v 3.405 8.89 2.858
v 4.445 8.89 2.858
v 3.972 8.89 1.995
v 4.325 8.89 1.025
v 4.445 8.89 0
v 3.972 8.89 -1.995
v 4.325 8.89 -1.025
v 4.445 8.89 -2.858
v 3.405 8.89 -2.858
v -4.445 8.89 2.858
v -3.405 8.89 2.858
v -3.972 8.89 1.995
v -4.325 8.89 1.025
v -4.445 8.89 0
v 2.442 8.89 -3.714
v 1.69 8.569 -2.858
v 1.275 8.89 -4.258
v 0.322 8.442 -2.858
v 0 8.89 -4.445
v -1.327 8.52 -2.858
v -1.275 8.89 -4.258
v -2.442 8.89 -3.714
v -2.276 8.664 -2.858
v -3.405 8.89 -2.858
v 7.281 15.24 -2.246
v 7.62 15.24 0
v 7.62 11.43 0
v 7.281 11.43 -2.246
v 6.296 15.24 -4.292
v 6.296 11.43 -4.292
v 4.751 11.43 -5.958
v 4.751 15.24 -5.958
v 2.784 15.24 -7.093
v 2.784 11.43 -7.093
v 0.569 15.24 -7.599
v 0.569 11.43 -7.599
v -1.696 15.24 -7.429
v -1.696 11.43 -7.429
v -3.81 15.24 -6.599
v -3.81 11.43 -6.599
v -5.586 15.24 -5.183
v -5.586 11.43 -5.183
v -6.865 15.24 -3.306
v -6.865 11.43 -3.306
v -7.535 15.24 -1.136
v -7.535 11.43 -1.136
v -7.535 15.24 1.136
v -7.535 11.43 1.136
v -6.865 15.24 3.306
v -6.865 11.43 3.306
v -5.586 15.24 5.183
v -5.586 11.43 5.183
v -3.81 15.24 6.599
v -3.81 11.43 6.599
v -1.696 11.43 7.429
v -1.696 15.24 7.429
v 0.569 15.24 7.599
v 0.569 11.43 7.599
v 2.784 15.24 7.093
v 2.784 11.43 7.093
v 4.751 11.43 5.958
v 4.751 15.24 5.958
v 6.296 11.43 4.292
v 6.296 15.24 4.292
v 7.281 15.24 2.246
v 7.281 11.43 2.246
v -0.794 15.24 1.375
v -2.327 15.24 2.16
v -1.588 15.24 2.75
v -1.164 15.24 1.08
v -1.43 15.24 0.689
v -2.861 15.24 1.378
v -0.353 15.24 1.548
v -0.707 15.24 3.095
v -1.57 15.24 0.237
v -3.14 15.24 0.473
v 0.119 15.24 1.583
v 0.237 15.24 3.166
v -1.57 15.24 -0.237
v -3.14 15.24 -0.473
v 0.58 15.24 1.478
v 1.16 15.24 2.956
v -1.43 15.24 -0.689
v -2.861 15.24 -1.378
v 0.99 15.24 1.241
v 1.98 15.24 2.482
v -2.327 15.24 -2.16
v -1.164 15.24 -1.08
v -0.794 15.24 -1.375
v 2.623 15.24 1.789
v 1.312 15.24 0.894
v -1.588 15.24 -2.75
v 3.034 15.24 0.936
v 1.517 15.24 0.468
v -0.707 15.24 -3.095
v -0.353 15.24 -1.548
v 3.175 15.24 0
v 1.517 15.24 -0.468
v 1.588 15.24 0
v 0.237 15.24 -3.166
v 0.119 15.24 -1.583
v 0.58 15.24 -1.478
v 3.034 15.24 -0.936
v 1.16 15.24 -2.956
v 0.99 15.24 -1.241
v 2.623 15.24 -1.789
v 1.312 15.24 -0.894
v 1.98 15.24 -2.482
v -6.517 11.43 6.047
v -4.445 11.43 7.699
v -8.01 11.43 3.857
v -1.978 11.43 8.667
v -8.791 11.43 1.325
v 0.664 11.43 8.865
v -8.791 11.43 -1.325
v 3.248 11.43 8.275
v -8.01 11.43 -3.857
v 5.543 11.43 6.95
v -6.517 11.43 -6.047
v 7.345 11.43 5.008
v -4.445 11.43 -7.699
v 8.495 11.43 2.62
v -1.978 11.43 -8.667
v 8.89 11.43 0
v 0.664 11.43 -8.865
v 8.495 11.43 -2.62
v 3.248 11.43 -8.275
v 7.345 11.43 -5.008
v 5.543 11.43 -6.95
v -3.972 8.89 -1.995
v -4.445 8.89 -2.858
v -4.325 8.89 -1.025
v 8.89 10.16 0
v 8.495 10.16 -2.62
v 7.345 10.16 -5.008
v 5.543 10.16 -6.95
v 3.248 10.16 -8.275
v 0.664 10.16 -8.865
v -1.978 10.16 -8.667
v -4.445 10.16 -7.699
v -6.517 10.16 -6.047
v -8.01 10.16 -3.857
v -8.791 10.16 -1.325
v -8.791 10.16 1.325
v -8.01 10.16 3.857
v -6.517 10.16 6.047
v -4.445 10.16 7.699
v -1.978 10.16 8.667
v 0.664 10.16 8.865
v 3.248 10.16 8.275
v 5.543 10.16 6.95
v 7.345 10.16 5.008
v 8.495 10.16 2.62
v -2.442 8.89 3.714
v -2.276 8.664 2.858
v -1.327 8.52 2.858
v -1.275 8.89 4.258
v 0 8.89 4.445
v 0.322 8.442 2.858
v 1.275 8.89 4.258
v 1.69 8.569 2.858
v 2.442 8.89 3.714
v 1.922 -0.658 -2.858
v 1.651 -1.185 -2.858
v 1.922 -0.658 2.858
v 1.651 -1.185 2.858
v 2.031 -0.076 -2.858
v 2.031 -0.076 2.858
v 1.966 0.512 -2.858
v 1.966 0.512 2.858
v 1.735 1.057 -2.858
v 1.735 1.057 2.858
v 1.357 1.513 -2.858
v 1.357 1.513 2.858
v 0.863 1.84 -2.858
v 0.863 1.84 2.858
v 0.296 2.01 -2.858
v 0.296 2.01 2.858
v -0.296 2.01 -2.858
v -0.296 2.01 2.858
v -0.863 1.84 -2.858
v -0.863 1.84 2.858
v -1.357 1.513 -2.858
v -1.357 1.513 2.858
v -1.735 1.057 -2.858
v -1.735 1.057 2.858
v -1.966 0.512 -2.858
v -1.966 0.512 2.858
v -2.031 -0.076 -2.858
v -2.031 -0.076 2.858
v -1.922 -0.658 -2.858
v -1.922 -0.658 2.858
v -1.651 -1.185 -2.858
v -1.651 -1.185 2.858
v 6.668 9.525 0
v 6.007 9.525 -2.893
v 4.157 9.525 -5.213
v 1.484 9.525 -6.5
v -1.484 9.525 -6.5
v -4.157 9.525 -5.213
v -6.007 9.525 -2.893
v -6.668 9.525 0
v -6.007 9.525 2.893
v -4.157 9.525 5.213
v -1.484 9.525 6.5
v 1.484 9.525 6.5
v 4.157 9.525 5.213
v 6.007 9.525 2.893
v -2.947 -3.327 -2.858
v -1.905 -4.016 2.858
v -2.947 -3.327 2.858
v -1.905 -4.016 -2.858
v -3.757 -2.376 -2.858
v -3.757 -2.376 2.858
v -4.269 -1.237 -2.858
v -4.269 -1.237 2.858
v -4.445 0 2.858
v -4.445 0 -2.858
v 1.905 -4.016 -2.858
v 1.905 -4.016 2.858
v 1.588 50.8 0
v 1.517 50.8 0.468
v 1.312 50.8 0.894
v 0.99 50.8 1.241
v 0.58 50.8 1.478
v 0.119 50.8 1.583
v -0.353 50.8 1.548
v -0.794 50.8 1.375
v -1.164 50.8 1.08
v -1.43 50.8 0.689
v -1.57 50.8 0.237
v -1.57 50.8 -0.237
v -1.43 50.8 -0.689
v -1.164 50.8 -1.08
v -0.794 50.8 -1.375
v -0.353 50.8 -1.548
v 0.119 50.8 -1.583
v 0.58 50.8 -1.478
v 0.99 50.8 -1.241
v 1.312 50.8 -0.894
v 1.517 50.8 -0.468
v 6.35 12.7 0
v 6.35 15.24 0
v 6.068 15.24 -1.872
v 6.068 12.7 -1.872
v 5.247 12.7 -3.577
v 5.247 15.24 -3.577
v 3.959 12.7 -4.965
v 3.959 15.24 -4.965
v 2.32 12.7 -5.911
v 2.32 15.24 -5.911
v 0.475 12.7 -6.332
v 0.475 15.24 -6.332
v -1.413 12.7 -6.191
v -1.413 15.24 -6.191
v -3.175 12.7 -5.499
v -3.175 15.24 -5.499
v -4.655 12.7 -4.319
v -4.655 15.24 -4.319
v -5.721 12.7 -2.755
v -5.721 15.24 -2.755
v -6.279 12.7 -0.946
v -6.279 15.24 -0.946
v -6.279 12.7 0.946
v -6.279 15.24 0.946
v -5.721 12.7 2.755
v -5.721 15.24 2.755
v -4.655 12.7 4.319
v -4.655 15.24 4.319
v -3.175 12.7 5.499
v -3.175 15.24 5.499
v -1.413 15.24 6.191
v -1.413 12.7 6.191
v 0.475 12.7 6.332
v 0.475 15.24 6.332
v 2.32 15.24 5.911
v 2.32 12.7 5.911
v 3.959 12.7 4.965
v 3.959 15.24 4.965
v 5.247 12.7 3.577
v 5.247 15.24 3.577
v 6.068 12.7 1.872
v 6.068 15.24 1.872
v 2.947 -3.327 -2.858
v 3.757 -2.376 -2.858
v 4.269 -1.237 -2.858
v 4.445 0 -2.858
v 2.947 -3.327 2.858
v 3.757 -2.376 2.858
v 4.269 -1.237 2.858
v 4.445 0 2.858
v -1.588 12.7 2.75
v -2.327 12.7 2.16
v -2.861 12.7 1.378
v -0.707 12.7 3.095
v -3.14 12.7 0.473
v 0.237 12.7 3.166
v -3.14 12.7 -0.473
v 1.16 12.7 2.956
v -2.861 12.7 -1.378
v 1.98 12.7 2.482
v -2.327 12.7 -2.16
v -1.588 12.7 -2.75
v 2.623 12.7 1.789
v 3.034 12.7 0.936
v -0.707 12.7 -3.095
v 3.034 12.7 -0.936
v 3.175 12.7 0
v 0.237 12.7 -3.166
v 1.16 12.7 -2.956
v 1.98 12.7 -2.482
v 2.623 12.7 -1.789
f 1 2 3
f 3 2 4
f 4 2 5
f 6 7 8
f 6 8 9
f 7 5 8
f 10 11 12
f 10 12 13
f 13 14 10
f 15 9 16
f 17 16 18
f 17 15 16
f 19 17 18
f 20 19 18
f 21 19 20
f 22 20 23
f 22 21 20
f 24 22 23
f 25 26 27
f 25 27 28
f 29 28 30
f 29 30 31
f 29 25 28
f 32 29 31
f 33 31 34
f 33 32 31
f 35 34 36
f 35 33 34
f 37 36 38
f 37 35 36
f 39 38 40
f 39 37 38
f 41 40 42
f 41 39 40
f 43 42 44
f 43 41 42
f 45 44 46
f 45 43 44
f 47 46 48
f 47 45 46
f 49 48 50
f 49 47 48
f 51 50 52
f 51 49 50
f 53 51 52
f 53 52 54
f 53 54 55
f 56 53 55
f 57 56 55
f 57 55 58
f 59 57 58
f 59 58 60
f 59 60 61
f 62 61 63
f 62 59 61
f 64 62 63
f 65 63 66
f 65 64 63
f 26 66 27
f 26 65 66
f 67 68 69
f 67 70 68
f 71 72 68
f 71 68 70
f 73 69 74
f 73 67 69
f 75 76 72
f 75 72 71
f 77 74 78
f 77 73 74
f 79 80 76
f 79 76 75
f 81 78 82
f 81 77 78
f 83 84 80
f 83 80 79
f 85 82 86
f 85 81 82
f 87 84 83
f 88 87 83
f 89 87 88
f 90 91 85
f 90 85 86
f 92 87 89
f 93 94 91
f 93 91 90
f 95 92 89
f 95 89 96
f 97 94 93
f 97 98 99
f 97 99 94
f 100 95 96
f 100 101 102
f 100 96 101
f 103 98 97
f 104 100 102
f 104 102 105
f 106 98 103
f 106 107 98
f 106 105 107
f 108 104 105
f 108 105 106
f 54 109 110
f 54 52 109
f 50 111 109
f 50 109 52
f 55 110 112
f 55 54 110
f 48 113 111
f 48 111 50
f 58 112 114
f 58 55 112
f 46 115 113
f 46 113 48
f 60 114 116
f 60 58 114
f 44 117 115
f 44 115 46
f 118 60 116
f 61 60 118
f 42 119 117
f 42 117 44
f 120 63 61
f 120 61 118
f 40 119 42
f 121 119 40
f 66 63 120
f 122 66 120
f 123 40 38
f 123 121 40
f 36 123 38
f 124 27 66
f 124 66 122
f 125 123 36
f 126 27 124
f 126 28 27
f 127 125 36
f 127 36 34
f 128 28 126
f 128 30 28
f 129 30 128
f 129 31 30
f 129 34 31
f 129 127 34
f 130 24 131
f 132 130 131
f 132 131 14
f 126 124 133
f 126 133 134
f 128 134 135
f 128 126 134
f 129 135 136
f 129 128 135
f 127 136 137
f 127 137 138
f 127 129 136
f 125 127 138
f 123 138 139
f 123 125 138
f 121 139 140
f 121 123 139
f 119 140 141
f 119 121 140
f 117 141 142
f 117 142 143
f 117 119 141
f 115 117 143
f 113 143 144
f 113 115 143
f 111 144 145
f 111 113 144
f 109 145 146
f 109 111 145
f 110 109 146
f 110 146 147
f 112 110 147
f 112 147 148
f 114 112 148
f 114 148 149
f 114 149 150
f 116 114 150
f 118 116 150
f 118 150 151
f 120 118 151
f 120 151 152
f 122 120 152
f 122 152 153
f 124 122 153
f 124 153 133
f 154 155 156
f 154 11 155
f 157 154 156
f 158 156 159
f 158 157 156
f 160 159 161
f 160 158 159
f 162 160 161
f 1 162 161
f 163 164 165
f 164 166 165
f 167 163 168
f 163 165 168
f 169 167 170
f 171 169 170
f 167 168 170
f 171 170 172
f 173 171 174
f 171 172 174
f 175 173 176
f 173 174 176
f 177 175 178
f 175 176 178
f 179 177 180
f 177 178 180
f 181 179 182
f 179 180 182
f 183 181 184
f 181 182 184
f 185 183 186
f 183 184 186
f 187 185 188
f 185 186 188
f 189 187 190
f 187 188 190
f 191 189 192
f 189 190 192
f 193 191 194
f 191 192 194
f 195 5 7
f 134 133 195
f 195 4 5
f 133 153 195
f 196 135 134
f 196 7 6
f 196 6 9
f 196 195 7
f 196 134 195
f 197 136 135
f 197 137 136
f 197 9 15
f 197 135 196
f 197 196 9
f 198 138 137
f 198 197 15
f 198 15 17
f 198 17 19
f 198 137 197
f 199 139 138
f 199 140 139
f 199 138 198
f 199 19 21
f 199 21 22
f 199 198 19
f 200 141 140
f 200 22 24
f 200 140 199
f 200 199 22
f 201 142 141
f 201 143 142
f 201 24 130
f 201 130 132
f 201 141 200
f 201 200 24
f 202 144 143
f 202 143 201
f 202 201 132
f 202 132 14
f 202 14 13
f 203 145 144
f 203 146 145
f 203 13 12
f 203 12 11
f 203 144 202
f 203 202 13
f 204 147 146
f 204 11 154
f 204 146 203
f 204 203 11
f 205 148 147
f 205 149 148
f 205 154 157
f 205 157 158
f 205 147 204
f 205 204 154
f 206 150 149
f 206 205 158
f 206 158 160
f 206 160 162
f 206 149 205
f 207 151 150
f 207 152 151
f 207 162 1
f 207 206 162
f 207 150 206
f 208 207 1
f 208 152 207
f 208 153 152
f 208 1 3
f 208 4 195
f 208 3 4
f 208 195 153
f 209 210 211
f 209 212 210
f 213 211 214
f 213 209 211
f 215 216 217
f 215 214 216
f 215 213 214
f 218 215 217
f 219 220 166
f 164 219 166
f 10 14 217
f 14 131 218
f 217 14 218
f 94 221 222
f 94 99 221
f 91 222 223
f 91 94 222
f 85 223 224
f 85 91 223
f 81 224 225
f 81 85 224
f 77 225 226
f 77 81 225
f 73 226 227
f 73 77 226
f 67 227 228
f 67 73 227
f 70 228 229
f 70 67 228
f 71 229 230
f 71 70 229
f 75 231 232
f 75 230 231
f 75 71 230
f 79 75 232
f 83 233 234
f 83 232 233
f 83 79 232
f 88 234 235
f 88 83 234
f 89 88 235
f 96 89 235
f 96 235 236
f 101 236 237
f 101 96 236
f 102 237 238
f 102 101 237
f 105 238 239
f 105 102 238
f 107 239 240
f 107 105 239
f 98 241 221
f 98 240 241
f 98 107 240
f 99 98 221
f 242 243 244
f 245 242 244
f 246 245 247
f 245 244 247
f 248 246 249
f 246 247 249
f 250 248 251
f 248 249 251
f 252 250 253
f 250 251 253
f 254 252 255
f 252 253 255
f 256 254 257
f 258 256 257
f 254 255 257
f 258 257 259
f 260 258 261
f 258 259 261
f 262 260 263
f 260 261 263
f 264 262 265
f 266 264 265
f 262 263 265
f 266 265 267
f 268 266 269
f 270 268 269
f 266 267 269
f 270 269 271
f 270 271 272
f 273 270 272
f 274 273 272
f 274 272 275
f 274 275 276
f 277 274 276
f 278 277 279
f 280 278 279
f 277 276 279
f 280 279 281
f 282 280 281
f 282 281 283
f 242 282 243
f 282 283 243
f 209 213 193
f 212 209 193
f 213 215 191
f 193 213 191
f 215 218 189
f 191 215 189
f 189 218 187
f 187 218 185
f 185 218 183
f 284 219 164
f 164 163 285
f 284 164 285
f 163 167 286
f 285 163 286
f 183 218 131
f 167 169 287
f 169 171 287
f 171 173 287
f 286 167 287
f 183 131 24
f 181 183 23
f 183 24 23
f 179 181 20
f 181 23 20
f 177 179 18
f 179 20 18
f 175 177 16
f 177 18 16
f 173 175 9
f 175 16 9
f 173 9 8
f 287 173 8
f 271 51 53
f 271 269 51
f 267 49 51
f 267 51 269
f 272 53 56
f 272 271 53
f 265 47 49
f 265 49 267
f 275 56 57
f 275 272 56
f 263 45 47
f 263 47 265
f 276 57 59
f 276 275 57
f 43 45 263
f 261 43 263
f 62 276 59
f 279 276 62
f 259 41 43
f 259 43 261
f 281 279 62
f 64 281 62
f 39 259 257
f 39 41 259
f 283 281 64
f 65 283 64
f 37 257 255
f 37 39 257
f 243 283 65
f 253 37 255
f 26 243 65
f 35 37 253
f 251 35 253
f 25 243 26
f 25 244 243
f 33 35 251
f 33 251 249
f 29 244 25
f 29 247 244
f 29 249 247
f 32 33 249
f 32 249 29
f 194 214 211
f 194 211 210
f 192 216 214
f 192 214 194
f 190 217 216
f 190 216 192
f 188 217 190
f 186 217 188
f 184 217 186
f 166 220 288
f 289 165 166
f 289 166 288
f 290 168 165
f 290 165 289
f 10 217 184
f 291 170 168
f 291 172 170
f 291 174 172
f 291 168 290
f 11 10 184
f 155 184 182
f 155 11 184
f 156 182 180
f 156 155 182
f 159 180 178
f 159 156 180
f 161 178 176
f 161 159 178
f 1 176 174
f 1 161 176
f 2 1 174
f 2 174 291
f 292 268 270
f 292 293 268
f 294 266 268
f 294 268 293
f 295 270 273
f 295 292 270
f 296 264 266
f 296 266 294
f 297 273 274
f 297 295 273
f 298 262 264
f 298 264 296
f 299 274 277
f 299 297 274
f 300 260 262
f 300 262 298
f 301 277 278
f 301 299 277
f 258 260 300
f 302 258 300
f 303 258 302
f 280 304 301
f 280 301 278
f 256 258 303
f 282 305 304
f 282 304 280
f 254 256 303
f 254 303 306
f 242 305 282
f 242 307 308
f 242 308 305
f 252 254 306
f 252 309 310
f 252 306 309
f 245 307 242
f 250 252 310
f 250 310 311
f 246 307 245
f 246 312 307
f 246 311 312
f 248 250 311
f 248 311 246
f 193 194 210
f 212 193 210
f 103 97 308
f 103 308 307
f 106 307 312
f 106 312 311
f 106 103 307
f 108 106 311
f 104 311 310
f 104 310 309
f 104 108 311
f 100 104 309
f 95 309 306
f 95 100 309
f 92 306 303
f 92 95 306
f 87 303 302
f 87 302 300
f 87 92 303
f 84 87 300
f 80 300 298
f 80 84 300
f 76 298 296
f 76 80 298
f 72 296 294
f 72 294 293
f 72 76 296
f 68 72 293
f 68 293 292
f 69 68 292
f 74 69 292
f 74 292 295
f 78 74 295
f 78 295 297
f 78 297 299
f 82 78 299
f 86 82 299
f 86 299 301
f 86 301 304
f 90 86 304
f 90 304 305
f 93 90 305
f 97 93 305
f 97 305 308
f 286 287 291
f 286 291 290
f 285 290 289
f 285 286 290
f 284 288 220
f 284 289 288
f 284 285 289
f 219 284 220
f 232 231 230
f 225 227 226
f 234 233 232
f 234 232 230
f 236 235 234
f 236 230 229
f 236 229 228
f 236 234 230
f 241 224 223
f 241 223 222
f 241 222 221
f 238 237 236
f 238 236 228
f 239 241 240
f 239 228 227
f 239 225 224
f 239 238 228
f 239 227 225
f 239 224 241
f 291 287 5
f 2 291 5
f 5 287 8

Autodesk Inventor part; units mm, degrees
ref_plane "YZ Plane" through (0, 0, 0) normal (1, 0, 0) x (0, 1, 0)
ref_plane "XZ Plane" through (0, 0, 0) normal (0, 1, 0) x (-1, 0, 0)
ref_plane "XY Plane" through (0, 0, 0) normal (0, 0, 1) x (1, 0, 0)
sketch "Sketch1" plane through (0, 0, 0) normal (0, 0, 1) x (1, 0, 0)
  arc A0 (-4.445, 0) -> (4.445, 0) centre (0, 0) ccw
  line L0 (-4.445, 0) -> (-4.445, 8.89)
  line L1 (-4.445, 8.89) -> (4.445, 8.89)
  line L2 (4.445, 8.89) -> (4.445, 0)
  arc A1 (4.445, 0) -> (-4.445, 0) centre (0, 0) ccw construction
  dimension "d0" = 8.89
  dimension "d1" = 8.89
sketch "Sketch1 outline for Extrusion1" plane through (0, 0, 0) normal (0, 0, 1) x (1, 0, 0)
  line L0 (-4.445, 8.89) -> (-4.445, 0)
  line L1 (4.445, 8.89) -> (-4.445, 8.89)
  line L2 (4.445, 0) -> (4.445, 8.89)
  arc A0 (-4.445, 0) -> (4.445, 0) centre (0, 0) ccw
extrude "Extrusion1" add sketch "Sketch1 outline for Extrusion1" along normal mid plane 5.715
sketch "Sketch2" plane through (0, 0, 2.8575) normal (0, 0, 1) x (1, 0, 0)
  arc A0 (1.651, -1.184577) -> (-1.651, -1.184577) centre (0, 0) ccw
  line L0 (1.651, -1.184577) -> (1.905, -4.016093)
  line L1 (0, 0) -> (0, -4.445) construction
  line L2 (-1.651, -1.184577) -> (-1.905, -4.016093)
  arc A1 (0, -2.032) -> (1.651, -1.184577) centre (0, 0) ccw construction
  arc A2 (-1.651, -1.184577) -> (0, -2.032) centre (0, 0) ccw construction
  arc A3 (-4.445, 0) -> (4.445, 0) centre (0, 0) ccw
  dimension "d4" = 4.064
  dimension "d5" = 3.81
  dimension "d6" = 3.302
sketch "Sketch2 outline for Extrusion2" plane through (0, 0, 2.8575) normal (0, 0, 1) x (1, 0, 0)
  line L0 (1.905, -4.016093) -> (1.651, -1.184577)
  arc A0 (-1.905, -4.016093) -> (1.905, -4.016093) centre (0, 0) ccw
  line L1 (-1.651, -1.184577) -> (-1.905, -4.016093)
  arc A1 (1.651, -1.184577) -> (-1.651, -1.184577) centre (0, 0) ccw
extrude "Extrusion2" cut sketch "Sketch2 outline for Extrusion2" against normal through all
sketch "Sketch3" plane through (0, 0, 0) normal (0, 0, 1) x (1, 0, 0)
  line L0 (4.445, 8.89) -> (-4.445, 8.89)
  line L1 (0, 7.62) -> (4.445, 8.89)
  line L2 (4.445, 8.89) -> (8.89, 10.16)
  line L3 (8.89, 10.16) -> (8.89, 11.43)
  line L4 (8.89, 11.43) -> (7.62, 11.43)
  line L5 (7.62, 11.43) -> (7.62, 15.24)
  line L6 (7.62, 15.24) -> (0, 15.24)
  line L7 (0, 15.24) -> (0, 7.62)
  line L8 (0, 0) -> (0, 8.89) construction
  line L9 (0, -7.867311) -> (0, 19.091219)
  dimension "d9" = 8.89
  dimension "d10" = 6.35
  dimension "d11" = 3.81
  dimension "d12" = 1.27
  dimension "d13" = 1.27
sketch "Sketch3 outline for Revolution1" plane through (0, 0, 0) normal (0, 0, 1) x (1, 0, 0)
  line L0 (0, 15.24) -> (0, 7.62)
  line L1 (7.62, 15.24) -> (0, 15.24)
  line L2 (7.62, 11.43) -> (7.62, 15.24)
  line L3 (8.89, 11.43) -> (7.62, 11.43)
  line L4 (8.89, 10.16) -> (8.89, 11.43)
  line L5 (4.445, 8.89) -> (8.89, 10.16)
  line L6 (0, 7.62) -> (4.445, 8.89)
revolve "Revolution1" add sketch "Sketch3 outline for Revolution1" angle 360 about axis through (0, -10, 0) along (0, 1, 0)
sketch "Sketch4" plane through (0, 15.24, 0) normal (0, 1, 0) x (1, 0, 0)
  circle A0 centre (0, 0) radius 3.175
  circle A1 centre (0, 0) radius 7.62 projected
  circle A2 centre (0, 0) radius 6.35
  dimension "d15" = 6.35
  dimension "d16" = 1.27
sketch "Sketch4 outline for Extrusion3" plane through (0, 15.24, 0) normal (0, 1, 0) x (1, 0, 0)
  circle A0 centre (0, 0) radius 6.35
  circle A1 centre (0, 0) radius 3.175
extrude "Extrusion3" cut sketch "Sketch4 outline for Extrusion3" against normal blind 2.54
sketch "Sketch5" plane through (0, 15.24, 0) normal (0, 1, 0) x (1, 0, 0)
  circle A0 centre (0, 0) radius 1.5875
  dimension "d19" = 3.175
sketch "Sketch5 outline for Extrusion4" plane through (0, 15.24, 0) normal (0, 1, 0) x (1, 0, 0)
  circle A0 centre (0, 0) radius 1.5875
extrude "Extrusion4" add sketch "Sketch5 outline for Extrusion4" along normal blind 35.56
properties part number "Bottom"
